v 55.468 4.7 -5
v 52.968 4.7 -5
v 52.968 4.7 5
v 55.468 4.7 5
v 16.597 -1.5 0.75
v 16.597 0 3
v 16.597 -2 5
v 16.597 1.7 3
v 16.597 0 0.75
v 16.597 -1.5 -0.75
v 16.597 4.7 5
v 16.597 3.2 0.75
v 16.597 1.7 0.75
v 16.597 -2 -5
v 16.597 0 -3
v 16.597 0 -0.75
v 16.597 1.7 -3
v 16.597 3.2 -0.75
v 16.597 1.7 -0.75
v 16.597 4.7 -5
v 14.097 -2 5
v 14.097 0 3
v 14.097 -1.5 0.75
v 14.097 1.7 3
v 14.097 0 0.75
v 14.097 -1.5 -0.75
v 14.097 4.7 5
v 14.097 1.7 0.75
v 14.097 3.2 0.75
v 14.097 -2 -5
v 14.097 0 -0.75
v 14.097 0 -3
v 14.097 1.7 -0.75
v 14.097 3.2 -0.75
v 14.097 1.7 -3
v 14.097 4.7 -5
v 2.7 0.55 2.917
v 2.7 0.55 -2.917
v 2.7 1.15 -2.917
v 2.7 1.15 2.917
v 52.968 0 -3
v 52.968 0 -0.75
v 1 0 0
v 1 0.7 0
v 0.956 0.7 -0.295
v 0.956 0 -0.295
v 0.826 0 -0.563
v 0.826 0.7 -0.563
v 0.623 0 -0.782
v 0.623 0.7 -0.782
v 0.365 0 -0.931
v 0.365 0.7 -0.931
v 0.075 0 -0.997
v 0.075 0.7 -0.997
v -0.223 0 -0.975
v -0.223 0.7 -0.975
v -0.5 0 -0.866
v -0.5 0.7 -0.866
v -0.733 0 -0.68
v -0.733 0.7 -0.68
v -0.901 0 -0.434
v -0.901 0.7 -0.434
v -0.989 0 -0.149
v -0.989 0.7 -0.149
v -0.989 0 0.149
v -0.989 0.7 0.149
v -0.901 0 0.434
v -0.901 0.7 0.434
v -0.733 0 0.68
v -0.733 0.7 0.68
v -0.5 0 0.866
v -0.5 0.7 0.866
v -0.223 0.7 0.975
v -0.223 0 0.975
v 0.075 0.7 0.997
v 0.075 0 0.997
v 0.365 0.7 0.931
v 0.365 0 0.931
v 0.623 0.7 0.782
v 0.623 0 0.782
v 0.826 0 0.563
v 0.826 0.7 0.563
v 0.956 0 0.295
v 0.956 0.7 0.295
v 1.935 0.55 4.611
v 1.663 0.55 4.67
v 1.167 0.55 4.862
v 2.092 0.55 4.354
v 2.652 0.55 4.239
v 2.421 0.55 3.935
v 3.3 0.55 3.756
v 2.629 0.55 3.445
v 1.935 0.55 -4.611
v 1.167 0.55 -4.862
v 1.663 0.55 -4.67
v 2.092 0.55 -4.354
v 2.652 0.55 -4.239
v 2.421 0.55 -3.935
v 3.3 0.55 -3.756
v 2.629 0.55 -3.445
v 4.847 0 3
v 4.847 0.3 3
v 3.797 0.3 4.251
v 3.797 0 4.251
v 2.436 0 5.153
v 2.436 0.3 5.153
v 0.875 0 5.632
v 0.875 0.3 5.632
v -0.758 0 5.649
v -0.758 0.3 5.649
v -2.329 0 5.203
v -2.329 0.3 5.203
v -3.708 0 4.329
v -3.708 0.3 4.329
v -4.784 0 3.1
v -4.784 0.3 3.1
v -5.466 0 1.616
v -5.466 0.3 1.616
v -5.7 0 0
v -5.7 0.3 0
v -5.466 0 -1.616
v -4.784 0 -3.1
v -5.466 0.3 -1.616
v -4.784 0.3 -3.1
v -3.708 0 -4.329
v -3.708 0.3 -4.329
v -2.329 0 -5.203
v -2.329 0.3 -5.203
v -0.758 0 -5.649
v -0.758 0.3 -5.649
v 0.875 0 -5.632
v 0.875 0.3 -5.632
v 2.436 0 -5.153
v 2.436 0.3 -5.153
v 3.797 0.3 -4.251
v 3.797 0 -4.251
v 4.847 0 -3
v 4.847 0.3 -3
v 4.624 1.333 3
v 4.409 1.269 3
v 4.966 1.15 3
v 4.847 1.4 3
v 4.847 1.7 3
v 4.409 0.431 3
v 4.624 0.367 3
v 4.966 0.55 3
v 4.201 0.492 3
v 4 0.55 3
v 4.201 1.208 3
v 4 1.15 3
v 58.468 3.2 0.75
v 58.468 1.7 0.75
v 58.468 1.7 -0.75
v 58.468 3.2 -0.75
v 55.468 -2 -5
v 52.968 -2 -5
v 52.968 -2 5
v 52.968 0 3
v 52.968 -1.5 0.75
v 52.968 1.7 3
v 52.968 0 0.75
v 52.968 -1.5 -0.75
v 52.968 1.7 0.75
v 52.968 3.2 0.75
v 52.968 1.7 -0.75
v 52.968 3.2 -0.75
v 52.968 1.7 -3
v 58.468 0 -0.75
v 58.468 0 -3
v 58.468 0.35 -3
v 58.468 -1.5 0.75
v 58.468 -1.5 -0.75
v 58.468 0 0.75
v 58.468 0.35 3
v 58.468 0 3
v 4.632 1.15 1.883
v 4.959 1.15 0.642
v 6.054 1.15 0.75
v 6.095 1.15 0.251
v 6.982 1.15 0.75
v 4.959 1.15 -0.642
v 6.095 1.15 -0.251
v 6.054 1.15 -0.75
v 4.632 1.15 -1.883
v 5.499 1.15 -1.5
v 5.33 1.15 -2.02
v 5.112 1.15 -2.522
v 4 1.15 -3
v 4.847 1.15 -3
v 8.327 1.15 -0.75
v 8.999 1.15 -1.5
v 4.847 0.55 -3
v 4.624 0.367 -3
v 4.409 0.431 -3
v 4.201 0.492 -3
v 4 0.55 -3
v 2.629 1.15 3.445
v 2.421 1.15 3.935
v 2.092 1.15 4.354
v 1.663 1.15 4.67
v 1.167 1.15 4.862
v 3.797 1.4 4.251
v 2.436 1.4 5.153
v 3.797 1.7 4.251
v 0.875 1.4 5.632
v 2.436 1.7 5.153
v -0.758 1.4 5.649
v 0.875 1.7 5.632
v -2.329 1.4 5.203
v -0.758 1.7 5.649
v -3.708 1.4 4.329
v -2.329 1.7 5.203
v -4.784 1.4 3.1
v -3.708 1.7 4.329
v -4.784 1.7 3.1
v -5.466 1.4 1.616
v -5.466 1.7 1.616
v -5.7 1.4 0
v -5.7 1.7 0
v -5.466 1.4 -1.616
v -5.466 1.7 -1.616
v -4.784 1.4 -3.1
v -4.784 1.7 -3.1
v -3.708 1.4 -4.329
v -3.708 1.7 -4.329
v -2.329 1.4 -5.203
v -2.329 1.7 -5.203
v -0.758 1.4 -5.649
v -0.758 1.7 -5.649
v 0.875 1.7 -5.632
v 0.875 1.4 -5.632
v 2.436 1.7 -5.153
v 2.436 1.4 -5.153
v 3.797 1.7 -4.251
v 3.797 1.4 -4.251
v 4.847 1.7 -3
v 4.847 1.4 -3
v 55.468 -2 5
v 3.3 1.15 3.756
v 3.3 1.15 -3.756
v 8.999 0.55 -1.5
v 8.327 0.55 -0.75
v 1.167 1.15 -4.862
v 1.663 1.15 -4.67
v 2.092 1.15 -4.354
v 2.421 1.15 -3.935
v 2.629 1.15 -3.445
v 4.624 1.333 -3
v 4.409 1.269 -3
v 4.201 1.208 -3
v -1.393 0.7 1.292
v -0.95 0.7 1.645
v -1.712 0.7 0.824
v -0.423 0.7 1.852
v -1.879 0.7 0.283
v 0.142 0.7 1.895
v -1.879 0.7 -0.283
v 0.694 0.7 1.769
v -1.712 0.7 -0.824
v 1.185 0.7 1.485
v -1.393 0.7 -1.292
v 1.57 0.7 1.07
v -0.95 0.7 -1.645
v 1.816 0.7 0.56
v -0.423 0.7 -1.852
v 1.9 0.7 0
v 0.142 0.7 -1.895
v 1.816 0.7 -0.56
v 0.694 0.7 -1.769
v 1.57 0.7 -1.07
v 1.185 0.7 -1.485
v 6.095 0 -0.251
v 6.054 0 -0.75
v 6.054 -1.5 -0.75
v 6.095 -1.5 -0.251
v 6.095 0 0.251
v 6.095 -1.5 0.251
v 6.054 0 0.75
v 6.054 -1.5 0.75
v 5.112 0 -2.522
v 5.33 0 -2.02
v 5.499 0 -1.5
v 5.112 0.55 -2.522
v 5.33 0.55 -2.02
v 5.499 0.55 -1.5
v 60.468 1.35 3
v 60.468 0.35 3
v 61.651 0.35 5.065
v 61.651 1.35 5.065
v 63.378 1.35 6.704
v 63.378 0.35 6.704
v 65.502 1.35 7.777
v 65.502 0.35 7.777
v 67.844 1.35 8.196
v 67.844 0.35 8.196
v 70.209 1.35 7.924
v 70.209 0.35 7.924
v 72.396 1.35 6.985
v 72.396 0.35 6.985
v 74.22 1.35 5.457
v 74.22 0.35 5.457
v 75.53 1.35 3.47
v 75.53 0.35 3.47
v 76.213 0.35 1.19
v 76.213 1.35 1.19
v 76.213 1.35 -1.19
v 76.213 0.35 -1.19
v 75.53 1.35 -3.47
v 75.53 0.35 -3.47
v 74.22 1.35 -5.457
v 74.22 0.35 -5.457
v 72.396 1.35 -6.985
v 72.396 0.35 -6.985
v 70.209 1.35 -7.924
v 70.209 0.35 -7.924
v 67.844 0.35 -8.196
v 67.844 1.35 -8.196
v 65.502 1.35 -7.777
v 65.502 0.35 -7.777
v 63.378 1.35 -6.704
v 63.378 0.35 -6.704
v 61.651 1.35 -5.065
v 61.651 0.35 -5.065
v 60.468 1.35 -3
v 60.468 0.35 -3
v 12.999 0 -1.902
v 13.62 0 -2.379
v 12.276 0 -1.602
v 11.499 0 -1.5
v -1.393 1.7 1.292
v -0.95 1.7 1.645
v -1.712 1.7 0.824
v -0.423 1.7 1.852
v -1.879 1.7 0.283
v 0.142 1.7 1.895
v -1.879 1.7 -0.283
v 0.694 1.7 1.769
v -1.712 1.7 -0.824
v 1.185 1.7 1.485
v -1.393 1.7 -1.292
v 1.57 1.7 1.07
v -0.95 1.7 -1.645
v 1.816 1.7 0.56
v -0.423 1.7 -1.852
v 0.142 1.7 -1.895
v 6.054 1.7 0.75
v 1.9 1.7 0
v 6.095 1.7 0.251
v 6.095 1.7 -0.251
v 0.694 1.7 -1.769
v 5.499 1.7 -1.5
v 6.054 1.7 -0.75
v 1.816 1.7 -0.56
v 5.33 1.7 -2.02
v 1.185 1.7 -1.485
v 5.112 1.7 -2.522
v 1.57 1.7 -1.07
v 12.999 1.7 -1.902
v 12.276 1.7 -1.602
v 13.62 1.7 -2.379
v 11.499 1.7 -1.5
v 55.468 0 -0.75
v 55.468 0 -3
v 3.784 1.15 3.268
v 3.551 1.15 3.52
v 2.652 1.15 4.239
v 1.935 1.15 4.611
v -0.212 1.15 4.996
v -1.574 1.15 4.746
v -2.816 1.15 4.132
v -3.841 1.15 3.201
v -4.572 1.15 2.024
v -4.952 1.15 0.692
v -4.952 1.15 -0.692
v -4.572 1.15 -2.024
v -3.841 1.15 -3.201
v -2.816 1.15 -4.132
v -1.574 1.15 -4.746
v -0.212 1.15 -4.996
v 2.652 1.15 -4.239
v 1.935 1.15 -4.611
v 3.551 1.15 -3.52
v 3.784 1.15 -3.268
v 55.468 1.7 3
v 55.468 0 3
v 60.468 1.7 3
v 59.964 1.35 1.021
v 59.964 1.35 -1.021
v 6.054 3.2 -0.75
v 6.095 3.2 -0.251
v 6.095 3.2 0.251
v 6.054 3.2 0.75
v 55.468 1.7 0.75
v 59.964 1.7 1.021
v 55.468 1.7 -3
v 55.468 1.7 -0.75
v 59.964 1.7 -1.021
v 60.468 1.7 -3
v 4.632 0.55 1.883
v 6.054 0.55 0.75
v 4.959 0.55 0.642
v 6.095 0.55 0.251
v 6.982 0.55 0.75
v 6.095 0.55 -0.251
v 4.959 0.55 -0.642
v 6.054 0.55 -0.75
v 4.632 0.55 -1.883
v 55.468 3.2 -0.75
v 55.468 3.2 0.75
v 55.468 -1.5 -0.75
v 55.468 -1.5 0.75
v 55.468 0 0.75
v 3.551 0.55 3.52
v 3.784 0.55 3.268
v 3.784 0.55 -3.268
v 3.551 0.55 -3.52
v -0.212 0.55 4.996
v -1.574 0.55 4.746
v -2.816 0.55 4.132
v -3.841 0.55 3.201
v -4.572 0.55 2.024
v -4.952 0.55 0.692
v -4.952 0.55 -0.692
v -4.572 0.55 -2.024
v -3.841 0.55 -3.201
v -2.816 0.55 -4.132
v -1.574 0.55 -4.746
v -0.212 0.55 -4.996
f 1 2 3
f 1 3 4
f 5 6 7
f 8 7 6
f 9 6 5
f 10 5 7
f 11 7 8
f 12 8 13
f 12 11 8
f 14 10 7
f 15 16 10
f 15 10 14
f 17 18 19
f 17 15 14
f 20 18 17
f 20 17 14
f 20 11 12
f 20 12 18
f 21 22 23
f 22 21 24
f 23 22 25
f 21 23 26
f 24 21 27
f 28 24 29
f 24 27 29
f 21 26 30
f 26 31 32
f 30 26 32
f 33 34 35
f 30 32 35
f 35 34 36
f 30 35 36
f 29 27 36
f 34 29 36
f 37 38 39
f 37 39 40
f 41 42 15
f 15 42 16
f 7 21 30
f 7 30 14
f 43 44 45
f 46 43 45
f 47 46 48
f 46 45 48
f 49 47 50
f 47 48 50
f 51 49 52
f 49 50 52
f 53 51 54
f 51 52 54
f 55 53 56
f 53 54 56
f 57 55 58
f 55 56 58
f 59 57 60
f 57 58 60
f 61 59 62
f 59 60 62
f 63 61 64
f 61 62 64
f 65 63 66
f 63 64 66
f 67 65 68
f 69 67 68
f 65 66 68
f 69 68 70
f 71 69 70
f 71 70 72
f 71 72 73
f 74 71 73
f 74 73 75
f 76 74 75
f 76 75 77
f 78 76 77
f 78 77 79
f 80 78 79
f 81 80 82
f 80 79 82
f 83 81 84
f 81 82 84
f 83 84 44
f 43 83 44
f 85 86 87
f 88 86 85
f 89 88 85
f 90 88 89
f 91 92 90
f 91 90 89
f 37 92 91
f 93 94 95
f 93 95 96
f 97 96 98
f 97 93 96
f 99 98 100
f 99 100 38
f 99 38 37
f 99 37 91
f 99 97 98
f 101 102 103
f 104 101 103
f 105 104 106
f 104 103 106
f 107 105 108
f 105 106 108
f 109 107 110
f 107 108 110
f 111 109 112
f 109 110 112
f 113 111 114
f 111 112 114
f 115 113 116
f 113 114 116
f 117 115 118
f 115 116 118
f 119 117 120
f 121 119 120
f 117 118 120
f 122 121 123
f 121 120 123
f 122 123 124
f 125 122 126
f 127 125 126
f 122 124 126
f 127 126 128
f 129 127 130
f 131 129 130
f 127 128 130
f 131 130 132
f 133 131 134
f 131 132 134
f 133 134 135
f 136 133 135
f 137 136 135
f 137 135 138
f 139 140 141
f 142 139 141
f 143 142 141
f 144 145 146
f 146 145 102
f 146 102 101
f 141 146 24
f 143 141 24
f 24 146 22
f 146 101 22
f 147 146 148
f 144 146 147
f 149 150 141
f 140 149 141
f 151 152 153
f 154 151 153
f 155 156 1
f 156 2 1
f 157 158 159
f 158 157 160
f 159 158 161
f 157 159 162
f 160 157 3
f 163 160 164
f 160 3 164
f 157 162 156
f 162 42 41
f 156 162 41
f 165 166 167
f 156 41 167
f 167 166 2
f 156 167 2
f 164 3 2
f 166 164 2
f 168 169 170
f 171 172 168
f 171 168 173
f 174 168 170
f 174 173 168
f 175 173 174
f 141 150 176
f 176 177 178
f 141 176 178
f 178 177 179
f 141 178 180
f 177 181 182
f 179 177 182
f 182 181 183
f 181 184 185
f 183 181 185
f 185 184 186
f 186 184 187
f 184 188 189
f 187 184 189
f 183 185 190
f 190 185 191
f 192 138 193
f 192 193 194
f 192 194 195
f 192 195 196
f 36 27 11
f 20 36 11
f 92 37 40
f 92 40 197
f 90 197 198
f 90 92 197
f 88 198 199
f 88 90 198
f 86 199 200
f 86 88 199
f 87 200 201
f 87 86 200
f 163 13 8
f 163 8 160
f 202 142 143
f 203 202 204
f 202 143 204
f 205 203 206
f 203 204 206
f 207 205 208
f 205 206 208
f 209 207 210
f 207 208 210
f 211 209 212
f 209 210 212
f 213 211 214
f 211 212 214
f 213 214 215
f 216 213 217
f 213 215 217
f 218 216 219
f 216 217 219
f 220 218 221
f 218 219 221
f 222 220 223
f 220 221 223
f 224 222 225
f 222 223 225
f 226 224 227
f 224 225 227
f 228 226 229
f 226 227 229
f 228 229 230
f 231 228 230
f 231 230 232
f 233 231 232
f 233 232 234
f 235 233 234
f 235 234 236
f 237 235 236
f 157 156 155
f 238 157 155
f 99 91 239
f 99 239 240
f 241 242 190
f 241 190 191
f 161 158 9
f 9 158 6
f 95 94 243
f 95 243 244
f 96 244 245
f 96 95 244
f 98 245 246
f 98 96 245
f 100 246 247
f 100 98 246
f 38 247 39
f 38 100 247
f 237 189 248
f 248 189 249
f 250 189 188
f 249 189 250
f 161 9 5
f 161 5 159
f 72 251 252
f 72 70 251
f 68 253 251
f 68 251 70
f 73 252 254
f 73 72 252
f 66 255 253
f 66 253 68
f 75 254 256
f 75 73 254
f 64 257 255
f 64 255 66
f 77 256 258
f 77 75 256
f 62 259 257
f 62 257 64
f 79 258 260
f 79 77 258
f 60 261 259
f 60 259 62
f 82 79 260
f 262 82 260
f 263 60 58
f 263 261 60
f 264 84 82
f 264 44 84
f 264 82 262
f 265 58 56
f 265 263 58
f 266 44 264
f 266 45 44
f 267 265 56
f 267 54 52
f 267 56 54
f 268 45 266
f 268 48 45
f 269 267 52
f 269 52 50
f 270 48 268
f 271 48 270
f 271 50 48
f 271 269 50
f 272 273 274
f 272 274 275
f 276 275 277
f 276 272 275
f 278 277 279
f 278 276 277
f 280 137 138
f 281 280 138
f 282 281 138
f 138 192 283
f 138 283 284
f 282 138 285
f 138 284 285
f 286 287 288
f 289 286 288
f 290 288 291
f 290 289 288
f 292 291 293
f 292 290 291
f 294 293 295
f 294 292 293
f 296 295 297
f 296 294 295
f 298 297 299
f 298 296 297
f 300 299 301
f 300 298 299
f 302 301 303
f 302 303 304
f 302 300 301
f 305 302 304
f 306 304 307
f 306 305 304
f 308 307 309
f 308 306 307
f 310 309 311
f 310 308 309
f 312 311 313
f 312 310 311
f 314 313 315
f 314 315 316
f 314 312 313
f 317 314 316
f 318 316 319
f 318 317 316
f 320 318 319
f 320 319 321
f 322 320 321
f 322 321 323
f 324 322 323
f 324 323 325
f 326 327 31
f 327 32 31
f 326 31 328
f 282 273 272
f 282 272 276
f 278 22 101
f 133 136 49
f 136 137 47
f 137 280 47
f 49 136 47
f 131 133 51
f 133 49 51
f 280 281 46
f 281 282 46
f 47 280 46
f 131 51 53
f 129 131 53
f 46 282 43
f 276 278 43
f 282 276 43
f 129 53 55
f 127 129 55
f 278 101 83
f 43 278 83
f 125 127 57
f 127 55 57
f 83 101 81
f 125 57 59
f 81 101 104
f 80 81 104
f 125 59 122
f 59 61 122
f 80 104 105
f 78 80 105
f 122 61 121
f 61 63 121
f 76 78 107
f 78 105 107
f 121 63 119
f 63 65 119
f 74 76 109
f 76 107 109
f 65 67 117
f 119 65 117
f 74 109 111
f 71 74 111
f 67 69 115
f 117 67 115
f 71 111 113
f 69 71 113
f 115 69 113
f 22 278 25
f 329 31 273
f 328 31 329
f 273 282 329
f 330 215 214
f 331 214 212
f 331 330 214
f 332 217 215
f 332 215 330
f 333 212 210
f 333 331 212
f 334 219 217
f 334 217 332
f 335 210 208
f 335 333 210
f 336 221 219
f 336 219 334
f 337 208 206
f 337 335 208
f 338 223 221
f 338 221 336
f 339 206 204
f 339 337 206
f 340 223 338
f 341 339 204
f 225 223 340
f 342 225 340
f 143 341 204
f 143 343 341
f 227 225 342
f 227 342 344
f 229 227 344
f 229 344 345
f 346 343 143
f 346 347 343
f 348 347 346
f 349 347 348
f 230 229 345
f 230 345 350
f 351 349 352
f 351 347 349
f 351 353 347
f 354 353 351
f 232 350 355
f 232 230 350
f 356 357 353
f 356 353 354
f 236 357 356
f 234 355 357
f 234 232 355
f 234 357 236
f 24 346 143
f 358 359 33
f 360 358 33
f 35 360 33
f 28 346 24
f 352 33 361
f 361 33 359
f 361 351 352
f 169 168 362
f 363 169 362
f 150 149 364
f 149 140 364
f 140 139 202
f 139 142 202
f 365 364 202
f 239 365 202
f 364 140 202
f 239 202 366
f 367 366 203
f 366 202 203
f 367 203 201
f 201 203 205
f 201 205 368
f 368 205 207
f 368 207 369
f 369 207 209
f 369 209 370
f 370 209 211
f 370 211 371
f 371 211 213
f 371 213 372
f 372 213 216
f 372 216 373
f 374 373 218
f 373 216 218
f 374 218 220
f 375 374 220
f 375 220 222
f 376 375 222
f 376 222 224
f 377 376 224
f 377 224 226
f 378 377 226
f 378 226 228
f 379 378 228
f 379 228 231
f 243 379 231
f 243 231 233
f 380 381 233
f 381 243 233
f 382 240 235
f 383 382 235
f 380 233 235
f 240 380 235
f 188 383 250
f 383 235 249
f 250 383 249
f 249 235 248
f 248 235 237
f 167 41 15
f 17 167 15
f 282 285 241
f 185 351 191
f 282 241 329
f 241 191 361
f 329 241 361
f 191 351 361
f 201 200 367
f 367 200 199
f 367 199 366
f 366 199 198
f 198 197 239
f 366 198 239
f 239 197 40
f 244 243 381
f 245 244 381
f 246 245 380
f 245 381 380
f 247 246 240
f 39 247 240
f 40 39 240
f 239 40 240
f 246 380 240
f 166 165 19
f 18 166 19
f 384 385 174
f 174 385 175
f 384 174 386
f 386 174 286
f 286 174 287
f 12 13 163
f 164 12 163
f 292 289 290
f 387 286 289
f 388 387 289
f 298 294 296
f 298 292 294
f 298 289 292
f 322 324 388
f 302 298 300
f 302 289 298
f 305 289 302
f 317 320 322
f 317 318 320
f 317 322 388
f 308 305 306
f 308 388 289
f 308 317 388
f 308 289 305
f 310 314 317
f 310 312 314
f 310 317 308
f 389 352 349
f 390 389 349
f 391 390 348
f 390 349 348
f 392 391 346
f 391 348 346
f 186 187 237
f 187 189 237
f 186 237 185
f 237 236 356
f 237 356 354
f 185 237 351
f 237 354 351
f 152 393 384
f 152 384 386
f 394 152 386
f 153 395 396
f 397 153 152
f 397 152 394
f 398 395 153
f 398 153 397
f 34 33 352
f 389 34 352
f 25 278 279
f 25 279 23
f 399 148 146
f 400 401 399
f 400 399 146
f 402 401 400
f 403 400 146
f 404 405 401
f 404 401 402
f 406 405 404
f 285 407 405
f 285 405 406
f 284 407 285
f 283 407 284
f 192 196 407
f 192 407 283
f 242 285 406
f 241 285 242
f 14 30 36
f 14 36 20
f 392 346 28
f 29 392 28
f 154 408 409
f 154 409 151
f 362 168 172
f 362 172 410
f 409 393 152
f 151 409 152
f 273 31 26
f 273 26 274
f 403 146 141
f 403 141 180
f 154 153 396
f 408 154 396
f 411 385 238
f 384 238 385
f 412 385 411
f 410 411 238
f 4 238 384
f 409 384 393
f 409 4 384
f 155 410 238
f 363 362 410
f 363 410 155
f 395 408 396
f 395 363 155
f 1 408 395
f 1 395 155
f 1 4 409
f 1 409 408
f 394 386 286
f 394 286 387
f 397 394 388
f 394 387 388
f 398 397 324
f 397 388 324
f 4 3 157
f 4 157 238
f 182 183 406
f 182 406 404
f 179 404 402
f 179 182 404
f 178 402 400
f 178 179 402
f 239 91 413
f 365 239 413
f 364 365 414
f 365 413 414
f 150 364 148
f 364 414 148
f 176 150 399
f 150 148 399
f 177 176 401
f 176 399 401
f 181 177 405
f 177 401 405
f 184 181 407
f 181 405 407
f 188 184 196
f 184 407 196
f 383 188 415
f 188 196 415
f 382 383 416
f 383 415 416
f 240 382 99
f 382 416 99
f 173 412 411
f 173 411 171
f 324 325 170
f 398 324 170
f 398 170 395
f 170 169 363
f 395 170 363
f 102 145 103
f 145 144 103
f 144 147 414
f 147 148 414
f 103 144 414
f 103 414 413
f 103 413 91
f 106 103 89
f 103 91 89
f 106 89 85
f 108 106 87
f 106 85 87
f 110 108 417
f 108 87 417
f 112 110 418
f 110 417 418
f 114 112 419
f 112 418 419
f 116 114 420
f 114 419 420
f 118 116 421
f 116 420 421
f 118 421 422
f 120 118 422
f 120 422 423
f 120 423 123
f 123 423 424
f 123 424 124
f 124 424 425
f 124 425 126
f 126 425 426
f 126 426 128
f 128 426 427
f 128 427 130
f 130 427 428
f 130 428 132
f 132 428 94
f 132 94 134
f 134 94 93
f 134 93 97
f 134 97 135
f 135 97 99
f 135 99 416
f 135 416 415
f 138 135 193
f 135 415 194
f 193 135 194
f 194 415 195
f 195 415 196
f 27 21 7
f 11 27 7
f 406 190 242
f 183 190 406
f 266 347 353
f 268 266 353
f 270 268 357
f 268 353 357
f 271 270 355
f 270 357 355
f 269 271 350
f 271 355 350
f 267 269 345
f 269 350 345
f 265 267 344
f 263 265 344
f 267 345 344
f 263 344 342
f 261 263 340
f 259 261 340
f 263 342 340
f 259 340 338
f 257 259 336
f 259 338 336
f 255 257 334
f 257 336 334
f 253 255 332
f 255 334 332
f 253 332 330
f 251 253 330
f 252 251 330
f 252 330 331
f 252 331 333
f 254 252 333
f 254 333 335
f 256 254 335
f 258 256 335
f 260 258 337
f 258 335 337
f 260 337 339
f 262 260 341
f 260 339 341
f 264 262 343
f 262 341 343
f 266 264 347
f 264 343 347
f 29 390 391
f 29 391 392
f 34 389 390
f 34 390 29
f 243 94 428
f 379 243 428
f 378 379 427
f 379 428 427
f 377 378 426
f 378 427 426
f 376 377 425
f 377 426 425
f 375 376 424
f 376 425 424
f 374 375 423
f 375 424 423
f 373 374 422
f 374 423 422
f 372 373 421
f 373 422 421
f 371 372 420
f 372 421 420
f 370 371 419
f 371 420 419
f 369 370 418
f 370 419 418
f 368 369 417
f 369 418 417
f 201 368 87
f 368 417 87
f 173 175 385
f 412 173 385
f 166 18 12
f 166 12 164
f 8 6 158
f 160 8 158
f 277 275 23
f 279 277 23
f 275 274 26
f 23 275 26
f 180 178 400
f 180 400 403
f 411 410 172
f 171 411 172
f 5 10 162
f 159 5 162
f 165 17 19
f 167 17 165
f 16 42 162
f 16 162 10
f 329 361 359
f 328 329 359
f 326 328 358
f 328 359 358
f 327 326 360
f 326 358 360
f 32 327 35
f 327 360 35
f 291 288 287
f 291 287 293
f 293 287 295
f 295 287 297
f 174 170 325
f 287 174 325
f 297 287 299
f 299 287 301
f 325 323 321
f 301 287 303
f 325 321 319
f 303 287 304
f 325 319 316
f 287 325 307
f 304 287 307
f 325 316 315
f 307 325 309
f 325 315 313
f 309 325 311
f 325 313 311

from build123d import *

# Parameters (mm, degrees)
SKETCH1_R                      = 5
BOSS_EXTRUDE1_DEPTH            = 1.7
EP_CABLESLOT_DEPTH             = 0.6
SKETCH4_R                      = 1.9
EP_BALLBEARINGSLOT_DEPTH       = 1
SKETCH5_R                      = 1
EP_SHAFTHOLE_DEPTH             = 0.7
BOSS_EXTRUDE2_START            = -0.85
BOSS_EXTRUDE2_DEPTH            = 1.7
HUMERUSCLEARANCECUT_DEPTH      = 1.7
CABLECLEARANCECUT_DEPTH        = 0.6
SKETCH6_3_R                    = 8.2
MAINPLATE_DEPTH                = 0.5
FINGERPULLEYCLEARANCECUT_DEPTH = 0.35
SKETCH10_W                     = 2.5
SKETCH10_H                     = 10
BLOCK1_DEPTH                   = 3
BLOCK1_DEPTH_BACK              = 3.7
SKETCH13_W                     = 2.5
SKETCH13_H                     = 10
BLOCK2_DEPTH                   = 3
BLOCK2_DEPTH_BACK              = 3.7
SKETCH14_W                     = 36.371319344
SKETCH14_H                     = 1.5
SKETCH14_W_2                   = 5.5
STIFFENERRIB_DEPTH             = 1.5
STIFFENERRIB_DEPTH_BACK        = 3.2


with BuildPart() as part:
    # Sketch1 → Boss-Extrude1 (new body)
    with BuildSketch(Plane(origin=(0, 0, 0), x_dir=(1, 0, 0), z_dir=(0, 1, 0))):
        Circle(SKETCH1_R)
    extrude(amount=BOSS_EXTRUDE1_DEPTH)

    # Sketch2 → Revolve1 (revolve)
    with BuildSketch(Plane.XY):
        Polygon((5, 1.7), (5, 1.15), (5.7, 1.4), (5.7, 1.7), align=None)
        Polygon((5, 0.55), (5, 0), (5.7, 0), (5.7, 0.3), align=None)
    revolve(axis=Axis((0, 1.7, 0), (0, -1, 0)))

    # Sketch3 → EP_CableSlot (cut)
    with BuildSketch(Plane(origin=(0, 0.55, 0), x_dir=(1, 0, 0), z_dir=(0, 1, 0))):
        with BuildLine():
            ThreePointArc((1.166666667, -4.861984049), (2.300738274, -4.439212024), (3.3, -3.756327994))
            Line((3.3, -3.756327994), (3.3, 3.756327994))
            ThreePointArc((3.3, 3.756327994), (2.300738274, 4.439212024), (1.166666667, 4.861984049))
            ThreePointArc((1.166666667, 4.861984049), (2.270562532, 4.155468804), (2.7, 2.917190429))
            Line((2.7, 2.917190429), (2.7, -2.917190429))
            ThreePointArc((2.7, -2.917190429), (2.270562532, -4.155468804), (1.166666667, -4.861984049))
        make_face()
    extrude(amount=EP_CABLESLOT_DEPTH, mode=Mode.SUBTRACT)

    # Sketch4 → EP_BallBearingSlot (cut)
    with BuildSketch(Plane(origin=(0, 1.7, 0), x_dir=(1, 0, 0), z_dir=(0, 1, 0))):
        Circle(SKETCH4_R)
    extrude(amount=-EP_BALLBEARINGSLOT_DEPTH, mode=Mode.SUBTRACT)

    # Sketch5 → EP_ShaftHole (cut)
    with BuildSketch(Plane(origin=(0, 0.7, 0), x_dir=(1, 0, 0), z_dir=(0, 1, 0))):
        Circle(SKETCH5_R)
    extrude(amount=-EP_SHAFTHOLE_DEPTH, mode=Mode.SUBTRACT)

    # Sketch6 → Boss-Extrude2 (add)
    with BuildSketch(Plane(origin=(0, 0.85, 0), x_dir=(1, 0, 0), z_dir=(0, 1, 0)).offset(BOSS_EXTRUDE2_START)):
        with BuildLine():
            ThreePointArc((4, 3), (5, 0), (4, -3))
            Line((4, -3), (60.468486389, -3))
            ThreePointArc((60.468486389, -3), (59.9, 0), (60.468486389, 3))
            Line((60.468486389, 3), (4, 3))
        make_face()
    extrude(amount=BOSS_EXTRUDE2_DEPTH)

    # Sketch8 → HumerusClearanceCut (cut)
    with BuildSketch(Plane(origin=(0, 1.7, 0), x_dir=(1, 0, 0), z_dir=(0, 1, 0))):
        with BuildLine():
            ThreePointArc((4.846648326, 3), (5.22695702, 2.273525963), (5.499090834, 1.5))
            Line((5.499090834, 1.5), (11.499090834, 1.5))
            ThreePointArc((11.499090834, 1.5), (12.999090834, 1.901923789), (14.097167045, 3))
            Line((14.097167045, 3), (4.846648326, 3))
        make_face()
    extrude(amount=-HUMERUSCLEARANCECUT_DEPTH, mode=Mode.SUBTRACT)

    # Sketch11 → CableClearanceCut (cut)
    with BuildSketch(Plane(origin=(0, 0.55, 0), x_dir=(1, 0, 0), z_dir=(0, 1, 0))):
        with BuildLine():
            Line((8.999090834, 1.5), (5.499090834, 1.5))
            ThreePointArc((5.499090834, 1.5), (5.641017612, -0.817875483), (4.846648326, -3))
            ThreePointArc((4.846648326, -3), (4.563342119, -3.415539299), (4.2445102, -3.804488555))
            Line((4.2445102, -3.804488555), (8.999090834, 1.5))
        make_face()
        with BuildLine():
            ThreePointArc((4.846648326, -3), (5.641017612, -0.817875483), (5.499090834, 1.5))
            ThreePointArc((5.499090834, 1.5), (5.22695702, 2.273525963), (4.846648326, 3))
            Line((4.846648326, 3), (4, 3))
            ThreePointArc((4, 3), (5, 0), (4, -3))
            Line((4, -3), (4.846648326, -3))
        make_face()
    extrude(amount=CABLECLEARANCECUT_DEPTH, mode=Mode.SUBTRACT)

    # Sketch6<3> → MainPlate (add, symmetric)
    with BuildSketch(Plane(origin=(0, 0.85, 0), x_dir=(1, 0, 0), z_dir=(0, 1, 0))):
        with Locations((68.1, 0)):
            Circle(SKETCH6_3_R)
    extrude(amount=MAINPLATE_DEPTH, both=True)

    # Sketch12 → FingerPulleyClearanceCut (cut)
    with BuildSketch(Plane(origin=(0, 0, 0), x_dir=(1, 0, 0), z_dir=(0, 1, 0))):
        with BuildLine():
            ThreePointArc((60.468486389, -3), (59.9, 0), (60.468486389, 3))
            Line((60.468486389, 3), (58.468486389, 3))
            Line((58.468486389, 3), (58.468486389, -3))
            Line((58.468486389, -3), (60.468486389, -3))
        make_face()
    extrude(amount=FINGERPULLEYCLEARANCECUT_DEPTH, mode=Mode.SUBTRACT)

    # Sketch10 → Block1 (add, two sides)
    with BuildSketch(Plane(origin=(0, 1.7, 0), x_dir=(1, 0, 0), z_dir=(0, 1, 0))) as block1_sk:
        with Locations((15.347167045, 0)):
            Rectangle(SKETCH10_W, SKETCH10_H)
    extrude(amount=BLOCK1_DEPTH)
    extrude(block1_sk.sketch, amount=-BLOCK1_DEPTH_BACK)

    # Sketch13 → Block2 (add, two sides)
    with BuildSketch(Plane(origin=(0, 1.7, 0), x_dir=(1, 0, 0), z_dir=(0, 1, 0))) as block2_sk:
        with Locations((54.218486389, 0)):
            Rectangle(SKETCH13_W, SKETCH13_H)
    extrude(amount=BLOCK2_DEPTH)
    extrude(block2_sk.sketch, amount=-BLOCK2_DEPTH_BACK)

    # Sketch14 → StiffenerRib (add, two sides)
    with BuildSketch(Plane(origin=(0, 1.7, 0), x_dir=(1, 0, 0), z_dir=(0, 1, 0))) as stiffenerrib_sk:
        with BuildLine():
            Line((16.597167045, -0.75), (16.597167045, 0.75))
            Line((16.597167045, 0.75), (6.053717866, 0.75))
            ThreePointArc((6.053717866, 0.75), (6.1, 0), (6.053717866, -0.75))
            Line((6.053717866, -0.75), (16.597167045, -0.75))
        make_face()
        with Locations((34.782826717, 0)):
            Rectangle(SKETCH14_W, SKETCH14_H)
        with Locations((55.718486389, 0)):
            Rectangle(SKETCH14_W_2, SKETCH14_H)
    extrude(amount=STIFFENERRIB_DEPTH)
    extrude(stiffenerrib_sk.sketch, amount=-STIFFENERRIB_DEPTH_BACK)


solid = part.part
